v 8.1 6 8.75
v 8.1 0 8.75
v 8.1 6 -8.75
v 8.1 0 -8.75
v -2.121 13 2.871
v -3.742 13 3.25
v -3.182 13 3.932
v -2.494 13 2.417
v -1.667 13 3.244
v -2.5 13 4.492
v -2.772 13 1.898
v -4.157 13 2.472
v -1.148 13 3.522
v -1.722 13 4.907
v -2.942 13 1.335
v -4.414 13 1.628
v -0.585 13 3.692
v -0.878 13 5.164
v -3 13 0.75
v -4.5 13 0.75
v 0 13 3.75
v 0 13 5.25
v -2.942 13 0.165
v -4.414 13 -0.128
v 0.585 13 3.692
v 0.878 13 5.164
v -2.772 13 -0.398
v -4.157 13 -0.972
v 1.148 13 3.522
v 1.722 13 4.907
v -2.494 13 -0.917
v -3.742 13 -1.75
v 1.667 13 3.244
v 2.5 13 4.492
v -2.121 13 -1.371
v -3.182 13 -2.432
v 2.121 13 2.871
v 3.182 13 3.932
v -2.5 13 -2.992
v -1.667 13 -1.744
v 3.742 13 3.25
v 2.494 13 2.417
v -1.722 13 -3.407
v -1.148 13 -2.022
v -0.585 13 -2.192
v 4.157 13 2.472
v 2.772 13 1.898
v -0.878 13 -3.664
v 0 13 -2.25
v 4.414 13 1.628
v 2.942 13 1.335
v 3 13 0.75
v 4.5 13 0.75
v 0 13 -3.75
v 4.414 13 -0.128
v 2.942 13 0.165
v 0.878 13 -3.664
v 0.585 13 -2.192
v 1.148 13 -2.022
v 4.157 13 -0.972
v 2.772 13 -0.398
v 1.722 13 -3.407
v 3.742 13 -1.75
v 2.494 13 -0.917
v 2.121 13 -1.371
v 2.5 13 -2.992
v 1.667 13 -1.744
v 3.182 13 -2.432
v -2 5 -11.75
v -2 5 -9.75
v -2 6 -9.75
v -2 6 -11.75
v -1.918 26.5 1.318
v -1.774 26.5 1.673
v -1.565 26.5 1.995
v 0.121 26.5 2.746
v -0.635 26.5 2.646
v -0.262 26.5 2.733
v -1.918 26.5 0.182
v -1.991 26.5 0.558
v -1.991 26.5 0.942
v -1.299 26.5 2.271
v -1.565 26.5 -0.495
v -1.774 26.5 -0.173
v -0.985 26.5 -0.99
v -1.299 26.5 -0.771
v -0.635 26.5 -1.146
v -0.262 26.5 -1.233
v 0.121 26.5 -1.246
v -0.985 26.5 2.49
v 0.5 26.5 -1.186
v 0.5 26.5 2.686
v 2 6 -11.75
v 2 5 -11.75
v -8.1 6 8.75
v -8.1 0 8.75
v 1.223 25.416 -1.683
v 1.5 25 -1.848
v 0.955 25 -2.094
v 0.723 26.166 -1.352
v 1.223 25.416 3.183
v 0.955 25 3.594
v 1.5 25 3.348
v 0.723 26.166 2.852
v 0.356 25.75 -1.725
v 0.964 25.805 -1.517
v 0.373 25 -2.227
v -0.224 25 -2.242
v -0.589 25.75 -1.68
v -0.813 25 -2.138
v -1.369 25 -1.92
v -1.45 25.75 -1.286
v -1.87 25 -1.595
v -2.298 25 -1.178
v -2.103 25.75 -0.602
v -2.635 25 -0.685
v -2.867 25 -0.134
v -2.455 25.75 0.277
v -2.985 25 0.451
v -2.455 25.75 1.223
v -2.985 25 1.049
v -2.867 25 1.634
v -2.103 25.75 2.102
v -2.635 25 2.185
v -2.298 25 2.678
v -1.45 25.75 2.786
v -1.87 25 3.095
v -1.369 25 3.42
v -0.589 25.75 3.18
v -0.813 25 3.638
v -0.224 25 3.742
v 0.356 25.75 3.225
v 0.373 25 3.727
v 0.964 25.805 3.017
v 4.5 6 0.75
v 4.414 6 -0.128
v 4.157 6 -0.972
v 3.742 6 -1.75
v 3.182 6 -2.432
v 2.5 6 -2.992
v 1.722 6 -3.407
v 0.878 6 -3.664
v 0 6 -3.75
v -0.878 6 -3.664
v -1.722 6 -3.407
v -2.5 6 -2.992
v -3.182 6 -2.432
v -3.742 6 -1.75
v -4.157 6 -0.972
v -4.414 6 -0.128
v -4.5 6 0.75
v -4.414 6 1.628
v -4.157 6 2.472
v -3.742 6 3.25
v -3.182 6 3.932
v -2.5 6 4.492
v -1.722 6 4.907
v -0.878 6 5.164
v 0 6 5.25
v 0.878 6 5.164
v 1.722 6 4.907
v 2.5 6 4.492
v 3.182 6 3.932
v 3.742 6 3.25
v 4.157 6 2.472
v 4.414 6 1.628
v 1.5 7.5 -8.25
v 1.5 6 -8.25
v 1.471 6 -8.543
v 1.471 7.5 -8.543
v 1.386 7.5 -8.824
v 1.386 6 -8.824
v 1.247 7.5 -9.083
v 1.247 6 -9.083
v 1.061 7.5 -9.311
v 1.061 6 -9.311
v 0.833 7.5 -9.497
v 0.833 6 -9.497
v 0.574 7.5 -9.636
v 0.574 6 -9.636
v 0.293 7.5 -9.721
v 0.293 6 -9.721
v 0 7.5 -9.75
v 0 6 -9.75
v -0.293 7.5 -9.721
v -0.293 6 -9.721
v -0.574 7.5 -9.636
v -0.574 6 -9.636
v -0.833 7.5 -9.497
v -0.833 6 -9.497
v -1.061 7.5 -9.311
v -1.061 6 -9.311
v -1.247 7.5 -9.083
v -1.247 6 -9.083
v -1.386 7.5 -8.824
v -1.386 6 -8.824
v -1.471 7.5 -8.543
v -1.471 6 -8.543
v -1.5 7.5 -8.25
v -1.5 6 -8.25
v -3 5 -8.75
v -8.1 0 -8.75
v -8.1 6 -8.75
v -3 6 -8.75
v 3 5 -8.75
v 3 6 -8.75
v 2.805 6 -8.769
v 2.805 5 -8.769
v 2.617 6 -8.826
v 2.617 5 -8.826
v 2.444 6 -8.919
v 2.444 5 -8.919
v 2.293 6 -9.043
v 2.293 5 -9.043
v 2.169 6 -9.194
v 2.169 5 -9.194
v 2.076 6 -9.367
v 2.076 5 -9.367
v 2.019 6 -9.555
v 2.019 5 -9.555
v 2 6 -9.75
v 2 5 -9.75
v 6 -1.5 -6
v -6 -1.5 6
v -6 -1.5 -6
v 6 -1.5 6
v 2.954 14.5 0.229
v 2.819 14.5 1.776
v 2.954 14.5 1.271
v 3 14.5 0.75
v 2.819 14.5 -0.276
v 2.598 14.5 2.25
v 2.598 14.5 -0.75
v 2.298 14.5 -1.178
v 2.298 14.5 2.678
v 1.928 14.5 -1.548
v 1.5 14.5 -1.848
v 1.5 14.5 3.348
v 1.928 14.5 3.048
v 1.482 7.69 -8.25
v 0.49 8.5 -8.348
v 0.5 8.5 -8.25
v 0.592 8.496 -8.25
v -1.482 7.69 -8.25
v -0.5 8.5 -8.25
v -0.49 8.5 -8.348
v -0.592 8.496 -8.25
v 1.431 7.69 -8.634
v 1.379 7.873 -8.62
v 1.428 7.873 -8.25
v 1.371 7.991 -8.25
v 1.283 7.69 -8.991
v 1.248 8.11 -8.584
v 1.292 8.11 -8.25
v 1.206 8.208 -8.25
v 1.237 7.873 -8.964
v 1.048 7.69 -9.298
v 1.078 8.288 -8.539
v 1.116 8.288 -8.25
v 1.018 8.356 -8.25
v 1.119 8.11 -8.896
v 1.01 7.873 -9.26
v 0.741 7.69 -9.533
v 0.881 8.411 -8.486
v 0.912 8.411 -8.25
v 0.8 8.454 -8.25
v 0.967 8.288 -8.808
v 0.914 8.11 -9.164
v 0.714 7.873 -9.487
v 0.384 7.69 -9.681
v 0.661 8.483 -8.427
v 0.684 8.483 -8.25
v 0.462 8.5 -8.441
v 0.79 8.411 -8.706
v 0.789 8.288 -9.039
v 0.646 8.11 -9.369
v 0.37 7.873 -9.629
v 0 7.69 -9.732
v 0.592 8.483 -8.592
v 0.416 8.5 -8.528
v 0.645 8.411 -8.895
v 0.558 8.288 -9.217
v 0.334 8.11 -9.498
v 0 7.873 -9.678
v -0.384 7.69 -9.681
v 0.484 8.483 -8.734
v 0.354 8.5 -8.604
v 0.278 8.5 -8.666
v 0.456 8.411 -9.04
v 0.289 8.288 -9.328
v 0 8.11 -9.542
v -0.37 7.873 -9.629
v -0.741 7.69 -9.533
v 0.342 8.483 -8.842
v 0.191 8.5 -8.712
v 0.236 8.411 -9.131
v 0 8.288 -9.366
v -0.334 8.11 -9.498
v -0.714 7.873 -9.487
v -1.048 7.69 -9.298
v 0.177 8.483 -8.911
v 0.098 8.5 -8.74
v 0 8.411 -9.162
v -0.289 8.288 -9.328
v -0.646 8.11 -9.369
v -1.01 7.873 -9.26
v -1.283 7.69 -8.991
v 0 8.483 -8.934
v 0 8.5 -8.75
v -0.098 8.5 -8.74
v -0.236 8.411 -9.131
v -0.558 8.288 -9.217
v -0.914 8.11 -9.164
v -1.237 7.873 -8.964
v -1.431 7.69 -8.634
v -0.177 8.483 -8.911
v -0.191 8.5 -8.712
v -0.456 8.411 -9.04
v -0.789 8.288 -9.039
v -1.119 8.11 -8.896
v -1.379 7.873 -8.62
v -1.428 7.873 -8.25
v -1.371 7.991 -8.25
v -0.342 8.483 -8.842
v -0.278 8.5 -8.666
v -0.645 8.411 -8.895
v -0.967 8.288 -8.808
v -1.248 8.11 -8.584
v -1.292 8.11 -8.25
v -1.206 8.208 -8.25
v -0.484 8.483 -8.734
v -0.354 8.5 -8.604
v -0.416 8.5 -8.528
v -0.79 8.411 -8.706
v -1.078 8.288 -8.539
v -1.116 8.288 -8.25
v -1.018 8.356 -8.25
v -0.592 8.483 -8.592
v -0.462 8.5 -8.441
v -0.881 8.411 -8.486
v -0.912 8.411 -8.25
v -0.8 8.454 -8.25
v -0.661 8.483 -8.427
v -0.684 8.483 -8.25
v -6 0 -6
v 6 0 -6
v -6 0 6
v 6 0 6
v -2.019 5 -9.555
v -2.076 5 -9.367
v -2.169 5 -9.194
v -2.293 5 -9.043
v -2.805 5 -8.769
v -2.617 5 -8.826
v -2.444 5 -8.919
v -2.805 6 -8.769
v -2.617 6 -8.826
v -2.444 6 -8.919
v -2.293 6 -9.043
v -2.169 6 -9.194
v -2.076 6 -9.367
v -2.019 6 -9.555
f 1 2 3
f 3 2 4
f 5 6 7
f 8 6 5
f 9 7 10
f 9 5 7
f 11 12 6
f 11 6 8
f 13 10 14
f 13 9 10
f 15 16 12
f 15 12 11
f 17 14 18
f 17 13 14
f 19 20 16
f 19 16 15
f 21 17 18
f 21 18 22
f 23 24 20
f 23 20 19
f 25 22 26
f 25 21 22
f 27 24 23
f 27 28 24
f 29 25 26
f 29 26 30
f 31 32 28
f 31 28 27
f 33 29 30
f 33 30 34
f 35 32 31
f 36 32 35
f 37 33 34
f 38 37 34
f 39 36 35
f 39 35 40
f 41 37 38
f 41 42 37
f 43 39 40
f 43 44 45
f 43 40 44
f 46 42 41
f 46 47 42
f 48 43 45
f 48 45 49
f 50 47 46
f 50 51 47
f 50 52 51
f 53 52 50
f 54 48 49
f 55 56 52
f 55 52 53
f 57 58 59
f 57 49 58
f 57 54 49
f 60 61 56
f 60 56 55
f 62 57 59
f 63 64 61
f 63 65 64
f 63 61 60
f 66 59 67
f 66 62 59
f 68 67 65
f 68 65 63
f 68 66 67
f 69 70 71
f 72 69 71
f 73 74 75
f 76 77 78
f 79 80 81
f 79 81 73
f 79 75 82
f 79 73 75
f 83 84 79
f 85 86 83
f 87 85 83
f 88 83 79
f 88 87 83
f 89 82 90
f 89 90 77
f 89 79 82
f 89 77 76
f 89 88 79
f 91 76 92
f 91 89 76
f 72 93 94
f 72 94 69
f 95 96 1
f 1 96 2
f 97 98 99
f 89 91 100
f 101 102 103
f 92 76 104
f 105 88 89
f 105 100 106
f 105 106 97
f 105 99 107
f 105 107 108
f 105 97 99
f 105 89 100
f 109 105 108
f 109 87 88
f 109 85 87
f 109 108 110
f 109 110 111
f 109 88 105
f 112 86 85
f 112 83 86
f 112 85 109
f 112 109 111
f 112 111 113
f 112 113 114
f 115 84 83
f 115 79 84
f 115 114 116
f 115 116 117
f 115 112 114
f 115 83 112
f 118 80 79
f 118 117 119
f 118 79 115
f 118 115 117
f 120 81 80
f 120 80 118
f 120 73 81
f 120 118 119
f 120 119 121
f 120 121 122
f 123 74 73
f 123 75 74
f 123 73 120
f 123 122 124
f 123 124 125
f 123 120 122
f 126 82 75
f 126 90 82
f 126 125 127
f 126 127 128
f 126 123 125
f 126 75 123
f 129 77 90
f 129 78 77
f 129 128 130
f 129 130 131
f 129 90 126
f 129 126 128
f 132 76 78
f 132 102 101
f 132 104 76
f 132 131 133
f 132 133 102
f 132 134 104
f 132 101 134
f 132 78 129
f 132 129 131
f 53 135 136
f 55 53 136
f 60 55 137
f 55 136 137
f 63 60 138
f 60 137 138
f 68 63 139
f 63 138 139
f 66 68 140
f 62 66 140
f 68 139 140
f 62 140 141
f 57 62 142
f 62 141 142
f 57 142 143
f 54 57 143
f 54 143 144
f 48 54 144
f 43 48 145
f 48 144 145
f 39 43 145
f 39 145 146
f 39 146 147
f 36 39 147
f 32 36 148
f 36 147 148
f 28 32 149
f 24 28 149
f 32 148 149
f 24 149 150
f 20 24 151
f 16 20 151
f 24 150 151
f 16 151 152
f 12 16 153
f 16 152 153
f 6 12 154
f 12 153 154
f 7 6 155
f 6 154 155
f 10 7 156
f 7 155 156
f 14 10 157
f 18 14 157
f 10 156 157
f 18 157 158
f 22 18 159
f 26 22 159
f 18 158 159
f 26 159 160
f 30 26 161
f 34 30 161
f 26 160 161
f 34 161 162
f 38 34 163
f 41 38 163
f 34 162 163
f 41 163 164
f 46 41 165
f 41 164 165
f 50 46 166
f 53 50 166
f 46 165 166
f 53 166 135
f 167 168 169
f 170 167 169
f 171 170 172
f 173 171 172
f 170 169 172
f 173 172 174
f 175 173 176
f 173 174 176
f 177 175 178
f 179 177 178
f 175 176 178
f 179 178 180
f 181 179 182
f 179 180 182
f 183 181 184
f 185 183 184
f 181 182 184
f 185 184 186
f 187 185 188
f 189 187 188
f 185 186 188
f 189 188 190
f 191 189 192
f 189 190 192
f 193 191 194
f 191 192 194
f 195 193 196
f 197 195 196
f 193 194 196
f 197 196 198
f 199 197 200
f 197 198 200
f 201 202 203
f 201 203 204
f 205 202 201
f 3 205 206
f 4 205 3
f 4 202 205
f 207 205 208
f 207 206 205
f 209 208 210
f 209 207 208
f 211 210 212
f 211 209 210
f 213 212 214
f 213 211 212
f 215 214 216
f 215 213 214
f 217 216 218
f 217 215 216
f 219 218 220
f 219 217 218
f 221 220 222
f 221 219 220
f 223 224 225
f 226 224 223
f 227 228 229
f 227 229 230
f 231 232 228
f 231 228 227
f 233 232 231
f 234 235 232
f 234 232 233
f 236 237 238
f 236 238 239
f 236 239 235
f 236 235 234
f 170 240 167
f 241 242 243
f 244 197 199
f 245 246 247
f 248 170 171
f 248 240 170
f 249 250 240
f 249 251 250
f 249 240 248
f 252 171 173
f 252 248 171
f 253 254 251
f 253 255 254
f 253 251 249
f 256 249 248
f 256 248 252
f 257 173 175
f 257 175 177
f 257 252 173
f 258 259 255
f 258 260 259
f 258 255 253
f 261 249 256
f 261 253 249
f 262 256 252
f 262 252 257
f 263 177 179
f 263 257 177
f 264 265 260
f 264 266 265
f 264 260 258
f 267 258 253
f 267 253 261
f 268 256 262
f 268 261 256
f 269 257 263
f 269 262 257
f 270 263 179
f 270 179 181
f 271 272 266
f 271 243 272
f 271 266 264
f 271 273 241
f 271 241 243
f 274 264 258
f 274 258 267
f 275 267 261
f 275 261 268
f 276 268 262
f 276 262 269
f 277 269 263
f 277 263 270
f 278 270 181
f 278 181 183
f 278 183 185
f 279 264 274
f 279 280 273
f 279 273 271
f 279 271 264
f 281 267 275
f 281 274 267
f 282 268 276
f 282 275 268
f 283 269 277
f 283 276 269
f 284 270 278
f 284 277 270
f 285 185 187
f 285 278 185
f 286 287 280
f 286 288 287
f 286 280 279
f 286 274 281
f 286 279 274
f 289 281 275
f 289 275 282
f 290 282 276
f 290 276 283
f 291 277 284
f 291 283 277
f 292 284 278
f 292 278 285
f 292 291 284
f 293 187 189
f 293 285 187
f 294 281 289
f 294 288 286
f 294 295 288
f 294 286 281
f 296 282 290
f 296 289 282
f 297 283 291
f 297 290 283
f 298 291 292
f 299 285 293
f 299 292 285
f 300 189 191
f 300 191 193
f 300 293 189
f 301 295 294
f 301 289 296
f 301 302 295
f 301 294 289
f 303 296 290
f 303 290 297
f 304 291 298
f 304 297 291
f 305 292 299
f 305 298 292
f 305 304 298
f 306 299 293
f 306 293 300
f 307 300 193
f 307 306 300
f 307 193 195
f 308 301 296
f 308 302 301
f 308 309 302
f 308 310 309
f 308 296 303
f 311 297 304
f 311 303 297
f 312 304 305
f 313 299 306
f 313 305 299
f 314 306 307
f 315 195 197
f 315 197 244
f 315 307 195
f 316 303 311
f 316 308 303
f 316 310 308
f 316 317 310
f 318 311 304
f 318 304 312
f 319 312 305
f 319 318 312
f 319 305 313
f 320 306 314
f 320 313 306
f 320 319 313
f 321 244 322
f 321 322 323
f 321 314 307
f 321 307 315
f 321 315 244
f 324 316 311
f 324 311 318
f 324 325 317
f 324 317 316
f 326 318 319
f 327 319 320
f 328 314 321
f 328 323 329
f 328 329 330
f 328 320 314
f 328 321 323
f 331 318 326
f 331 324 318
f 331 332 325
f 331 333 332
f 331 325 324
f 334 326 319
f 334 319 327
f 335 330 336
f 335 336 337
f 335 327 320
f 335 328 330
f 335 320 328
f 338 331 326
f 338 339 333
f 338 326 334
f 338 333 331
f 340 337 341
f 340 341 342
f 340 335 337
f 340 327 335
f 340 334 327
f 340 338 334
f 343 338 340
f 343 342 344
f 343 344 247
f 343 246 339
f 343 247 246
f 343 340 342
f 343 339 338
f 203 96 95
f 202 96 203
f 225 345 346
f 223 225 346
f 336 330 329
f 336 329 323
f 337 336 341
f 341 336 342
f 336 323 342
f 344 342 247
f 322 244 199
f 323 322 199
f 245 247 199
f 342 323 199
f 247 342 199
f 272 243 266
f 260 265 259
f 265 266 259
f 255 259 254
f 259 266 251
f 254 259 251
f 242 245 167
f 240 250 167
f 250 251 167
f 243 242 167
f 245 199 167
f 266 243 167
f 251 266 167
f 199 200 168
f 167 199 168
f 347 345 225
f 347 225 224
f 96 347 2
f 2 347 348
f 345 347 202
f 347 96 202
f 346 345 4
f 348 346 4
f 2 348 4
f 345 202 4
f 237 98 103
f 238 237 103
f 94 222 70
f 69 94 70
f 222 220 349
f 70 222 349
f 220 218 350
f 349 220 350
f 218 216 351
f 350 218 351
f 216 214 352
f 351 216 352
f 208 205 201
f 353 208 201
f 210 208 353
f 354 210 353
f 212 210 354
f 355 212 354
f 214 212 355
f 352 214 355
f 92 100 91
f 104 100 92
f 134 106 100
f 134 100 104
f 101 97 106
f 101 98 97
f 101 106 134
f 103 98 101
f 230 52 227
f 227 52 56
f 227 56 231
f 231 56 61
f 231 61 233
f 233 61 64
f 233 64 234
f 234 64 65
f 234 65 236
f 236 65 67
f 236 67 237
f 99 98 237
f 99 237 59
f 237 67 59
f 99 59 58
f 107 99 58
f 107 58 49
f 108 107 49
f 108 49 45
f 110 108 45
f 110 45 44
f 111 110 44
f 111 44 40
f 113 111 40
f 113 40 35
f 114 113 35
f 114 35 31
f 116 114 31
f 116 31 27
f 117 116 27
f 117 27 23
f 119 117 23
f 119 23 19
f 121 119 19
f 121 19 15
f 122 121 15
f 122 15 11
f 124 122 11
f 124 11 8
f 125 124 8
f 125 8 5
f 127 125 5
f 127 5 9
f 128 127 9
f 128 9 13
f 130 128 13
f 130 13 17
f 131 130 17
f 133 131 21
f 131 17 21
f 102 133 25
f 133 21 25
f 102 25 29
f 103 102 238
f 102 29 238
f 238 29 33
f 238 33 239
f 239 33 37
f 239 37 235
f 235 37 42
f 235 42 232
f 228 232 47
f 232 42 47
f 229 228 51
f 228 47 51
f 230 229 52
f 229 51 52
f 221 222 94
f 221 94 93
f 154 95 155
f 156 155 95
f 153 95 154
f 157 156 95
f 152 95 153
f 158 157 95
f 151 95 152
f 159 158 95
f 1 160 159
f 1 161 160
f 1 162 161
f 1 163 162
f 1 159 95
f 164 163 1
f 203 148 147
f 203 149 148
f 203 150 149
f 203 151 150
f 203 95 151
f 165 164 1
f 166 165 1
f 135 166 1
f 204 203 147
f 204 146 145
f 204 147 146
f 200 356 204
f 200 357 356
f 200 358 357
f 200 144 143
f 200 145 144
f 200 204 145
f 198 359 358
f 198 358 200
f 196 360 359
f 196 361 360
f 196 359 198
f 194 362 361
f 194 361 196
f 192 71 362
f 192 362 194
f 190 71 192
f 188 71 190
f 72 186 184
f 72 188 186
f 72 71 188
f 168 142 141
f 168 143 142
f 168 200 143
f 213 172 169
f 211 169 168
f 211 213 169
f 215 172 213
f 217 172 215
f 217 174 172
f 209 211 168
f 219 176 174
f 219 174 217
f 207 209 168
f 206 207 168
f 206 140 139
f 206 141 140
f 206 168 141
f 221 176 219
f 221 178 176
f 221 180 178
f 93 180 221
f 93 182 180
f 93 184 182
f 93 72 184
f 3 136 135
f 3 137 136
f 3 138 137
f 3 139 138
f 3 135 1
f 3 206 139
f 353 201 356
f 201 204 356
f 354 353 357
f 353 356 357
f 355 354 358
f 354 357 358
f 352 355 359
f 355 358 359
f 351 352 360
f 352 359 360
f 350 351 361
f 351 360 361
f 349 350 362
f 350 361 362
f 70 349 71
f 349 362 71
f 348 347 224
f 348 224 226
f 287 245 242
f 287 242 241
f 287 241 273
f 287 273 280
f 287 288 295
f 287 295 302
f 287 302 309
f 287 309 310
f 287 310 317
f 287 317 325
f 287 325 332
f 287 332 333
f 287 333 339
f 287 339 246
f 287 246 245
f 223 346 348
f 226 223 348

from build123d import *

# Parameters (mm, degrees)
SKETCH1_W           = 16.2
SKETCH1_H           = 17.5
BOSS_EXTRUDE1_DEPTH = 6
SKETCH2_W           = 12
SKETCH2_H           = 12
BOSS_EXTRUDE2_DEPTH = 1.5
SKETCH3_R           = 4.5
BOSS_EXTRUDE3_DEPTH = 7
SKETCH4_R           = 3
BOSS_EXTRUDE4_DEPTH = 13.5
CUT_EXTRUDE1_DEPTH  = 12
SKETCH6_W           = 4
SKETCH6_H           = 1
BOSS_EXTRUDE5_DEPTH = 3
FILLET1_R           = 1
CHAMFER1_SIZE       = 1.5
CHAMFER1_SIZE2      = 1
CHAMFER2_SIZE       = 1
CHAMFER2_SIZE2      = 1.5
BOSS_EXTRUDE6_DEPTH = 2.5
FILLET2_R           = 1


with BuildPart() as part:
    # Sketch1 → Boss-Extrude1 (new body)
    with BuildSketch(Plane(origin=(0, 0, 0), x_dir=(1, 0, 0), z_dir=(0, 1, 0))):
        Rectangle(SKETCH1_W, SKETCH1_H)
    extrude(amount=BOSS_EXTRUDE1_DEPTH)

    # Sketch2 → Boss-Extrude2 (add)
    with BuildSketch(Plane.XZ):
        Rectangle(SKETCH2_W, SKETCH2_H)
    extrude(amount=BOSS_EXTRUDE2_DEPTH)

    # Sketch3 → Boss-Extrude3 (add)
    with BuildSketch(Plane(origin=(0, 6, 0), x_dir=(1, 0, 0), z_dir=(0, 1, 0))):
        with Locations((0, -0.75)):
            Circle(SKETCH3_R)
    extrude(amount=BOSS_EXTRUDE3_DEPTH)

    # Sketch4 → Boss-Extrude4 (add)
    with BuildSketch(Plane(origin=(0, 13, 0), x_dir=(1, 0, 0), z_dir=(0, 1, 0))):
        with Locations((0, -0.75)):
            Circle(SKETCH4_R)
    extrude(amount=BOSS_EXTRUDE4_DEPTH)

    # Sketch5 → Cut-Extrude1 (cut)
    with BuildSketch(Plane(origin=(0, 26.5, 0), x_dir=(1, 0, 0), z_dir=(0, 1, 0))):
        with BuildLine():
            ThreePointArc((3, -0.75), (2.598076211, 0.75), (1.5, 1.848076211))
            Line((1.5, 1.848076211), (1.5, -3.348076211))
            ThreePointArc((1.5, -3.348076211), (2.598076211, -2.25), (3, -0.75))
        make_face()
    extrude(amount=-CUT_EXTRUDE1_DEPTH, mode=Mode.SUBTRACT)

    # Sketch6 → Boss-Extrude5 (add)
    with BuildSketch(Plane(origin=(0, 0, -8.75), x_dir=(-1, 0, 0), z_dir=(0, 0, -1))):
        with Locations((0, 5.5)):
            Rectangle(SKETCH6_W, SKETCH6_H)
    extrude(amount=BOSS_EXTRUDE5_DEPTH)

    # Fillet1
    fillet1_edges = [part.edges().sort_by_distance(p)[0] for p in [
        (-2, 5.5, -8.75),
        (2, 5.5, -8.75),
    ]]
    fillet(fillet1_edges, radius=FILLET1_R)

    # Chamfer1
    chamfer1_edges = [part.edges().sort_by_distance(p)[0] for p in [
        (-3, 26.5, 0.75),
    ]]
    chamfer1_side = [part.faces().sort_by_distance(p)[0] for p in [
        (-3, 19.75, 0.75),
    ]]
    chamfer(chamfer1_edges, length=CHAMFER1_SIZE, length2=CHAMFER1_SIZE2, reference=chamfer1_side[0])

    # Chamfer2
    chamfer2_edges = [part.edges().sort_by_distance(p)[0] for p in [
        (1.5, 26.5, 0.75),
    ]]
    chamfer2_side = [part.faces().sort_by_distance(p)[0] for p in [
        (-0.132366073, 26.5, 0.75),
    ]]
    chamfer(chamfer2_edges, length=CHAMFER2_SIZE, length2=CHAMFER2_SIZE2, reference=chamfer2_side[0])

    # Sketch7 → Boss-Extrude6 (add)
    with BuildSketch(Plane(origin=(0, 6, 0), x_dir=(1, 0, 0), z_dir=(0, 1, 0))):
        with BuildLine():
            Line((-1.5, 8.25), (1.5, 8.25))
            ThreePointArc((1.5, 8.25), (0, 9.75), (-1.5, 8.25))
        make_face()
    extrude(amount=BOSS_EXTRUDE6_DEPTH)

    # Fillet2
    fillet2_edges = [part.edges().sort_by_distance(p)[0] for p in [
        (0, 8.5, -9.75),
    ]]
    fillet(fillet2_edges, radius=FILLET2_R)


solid = part.part
